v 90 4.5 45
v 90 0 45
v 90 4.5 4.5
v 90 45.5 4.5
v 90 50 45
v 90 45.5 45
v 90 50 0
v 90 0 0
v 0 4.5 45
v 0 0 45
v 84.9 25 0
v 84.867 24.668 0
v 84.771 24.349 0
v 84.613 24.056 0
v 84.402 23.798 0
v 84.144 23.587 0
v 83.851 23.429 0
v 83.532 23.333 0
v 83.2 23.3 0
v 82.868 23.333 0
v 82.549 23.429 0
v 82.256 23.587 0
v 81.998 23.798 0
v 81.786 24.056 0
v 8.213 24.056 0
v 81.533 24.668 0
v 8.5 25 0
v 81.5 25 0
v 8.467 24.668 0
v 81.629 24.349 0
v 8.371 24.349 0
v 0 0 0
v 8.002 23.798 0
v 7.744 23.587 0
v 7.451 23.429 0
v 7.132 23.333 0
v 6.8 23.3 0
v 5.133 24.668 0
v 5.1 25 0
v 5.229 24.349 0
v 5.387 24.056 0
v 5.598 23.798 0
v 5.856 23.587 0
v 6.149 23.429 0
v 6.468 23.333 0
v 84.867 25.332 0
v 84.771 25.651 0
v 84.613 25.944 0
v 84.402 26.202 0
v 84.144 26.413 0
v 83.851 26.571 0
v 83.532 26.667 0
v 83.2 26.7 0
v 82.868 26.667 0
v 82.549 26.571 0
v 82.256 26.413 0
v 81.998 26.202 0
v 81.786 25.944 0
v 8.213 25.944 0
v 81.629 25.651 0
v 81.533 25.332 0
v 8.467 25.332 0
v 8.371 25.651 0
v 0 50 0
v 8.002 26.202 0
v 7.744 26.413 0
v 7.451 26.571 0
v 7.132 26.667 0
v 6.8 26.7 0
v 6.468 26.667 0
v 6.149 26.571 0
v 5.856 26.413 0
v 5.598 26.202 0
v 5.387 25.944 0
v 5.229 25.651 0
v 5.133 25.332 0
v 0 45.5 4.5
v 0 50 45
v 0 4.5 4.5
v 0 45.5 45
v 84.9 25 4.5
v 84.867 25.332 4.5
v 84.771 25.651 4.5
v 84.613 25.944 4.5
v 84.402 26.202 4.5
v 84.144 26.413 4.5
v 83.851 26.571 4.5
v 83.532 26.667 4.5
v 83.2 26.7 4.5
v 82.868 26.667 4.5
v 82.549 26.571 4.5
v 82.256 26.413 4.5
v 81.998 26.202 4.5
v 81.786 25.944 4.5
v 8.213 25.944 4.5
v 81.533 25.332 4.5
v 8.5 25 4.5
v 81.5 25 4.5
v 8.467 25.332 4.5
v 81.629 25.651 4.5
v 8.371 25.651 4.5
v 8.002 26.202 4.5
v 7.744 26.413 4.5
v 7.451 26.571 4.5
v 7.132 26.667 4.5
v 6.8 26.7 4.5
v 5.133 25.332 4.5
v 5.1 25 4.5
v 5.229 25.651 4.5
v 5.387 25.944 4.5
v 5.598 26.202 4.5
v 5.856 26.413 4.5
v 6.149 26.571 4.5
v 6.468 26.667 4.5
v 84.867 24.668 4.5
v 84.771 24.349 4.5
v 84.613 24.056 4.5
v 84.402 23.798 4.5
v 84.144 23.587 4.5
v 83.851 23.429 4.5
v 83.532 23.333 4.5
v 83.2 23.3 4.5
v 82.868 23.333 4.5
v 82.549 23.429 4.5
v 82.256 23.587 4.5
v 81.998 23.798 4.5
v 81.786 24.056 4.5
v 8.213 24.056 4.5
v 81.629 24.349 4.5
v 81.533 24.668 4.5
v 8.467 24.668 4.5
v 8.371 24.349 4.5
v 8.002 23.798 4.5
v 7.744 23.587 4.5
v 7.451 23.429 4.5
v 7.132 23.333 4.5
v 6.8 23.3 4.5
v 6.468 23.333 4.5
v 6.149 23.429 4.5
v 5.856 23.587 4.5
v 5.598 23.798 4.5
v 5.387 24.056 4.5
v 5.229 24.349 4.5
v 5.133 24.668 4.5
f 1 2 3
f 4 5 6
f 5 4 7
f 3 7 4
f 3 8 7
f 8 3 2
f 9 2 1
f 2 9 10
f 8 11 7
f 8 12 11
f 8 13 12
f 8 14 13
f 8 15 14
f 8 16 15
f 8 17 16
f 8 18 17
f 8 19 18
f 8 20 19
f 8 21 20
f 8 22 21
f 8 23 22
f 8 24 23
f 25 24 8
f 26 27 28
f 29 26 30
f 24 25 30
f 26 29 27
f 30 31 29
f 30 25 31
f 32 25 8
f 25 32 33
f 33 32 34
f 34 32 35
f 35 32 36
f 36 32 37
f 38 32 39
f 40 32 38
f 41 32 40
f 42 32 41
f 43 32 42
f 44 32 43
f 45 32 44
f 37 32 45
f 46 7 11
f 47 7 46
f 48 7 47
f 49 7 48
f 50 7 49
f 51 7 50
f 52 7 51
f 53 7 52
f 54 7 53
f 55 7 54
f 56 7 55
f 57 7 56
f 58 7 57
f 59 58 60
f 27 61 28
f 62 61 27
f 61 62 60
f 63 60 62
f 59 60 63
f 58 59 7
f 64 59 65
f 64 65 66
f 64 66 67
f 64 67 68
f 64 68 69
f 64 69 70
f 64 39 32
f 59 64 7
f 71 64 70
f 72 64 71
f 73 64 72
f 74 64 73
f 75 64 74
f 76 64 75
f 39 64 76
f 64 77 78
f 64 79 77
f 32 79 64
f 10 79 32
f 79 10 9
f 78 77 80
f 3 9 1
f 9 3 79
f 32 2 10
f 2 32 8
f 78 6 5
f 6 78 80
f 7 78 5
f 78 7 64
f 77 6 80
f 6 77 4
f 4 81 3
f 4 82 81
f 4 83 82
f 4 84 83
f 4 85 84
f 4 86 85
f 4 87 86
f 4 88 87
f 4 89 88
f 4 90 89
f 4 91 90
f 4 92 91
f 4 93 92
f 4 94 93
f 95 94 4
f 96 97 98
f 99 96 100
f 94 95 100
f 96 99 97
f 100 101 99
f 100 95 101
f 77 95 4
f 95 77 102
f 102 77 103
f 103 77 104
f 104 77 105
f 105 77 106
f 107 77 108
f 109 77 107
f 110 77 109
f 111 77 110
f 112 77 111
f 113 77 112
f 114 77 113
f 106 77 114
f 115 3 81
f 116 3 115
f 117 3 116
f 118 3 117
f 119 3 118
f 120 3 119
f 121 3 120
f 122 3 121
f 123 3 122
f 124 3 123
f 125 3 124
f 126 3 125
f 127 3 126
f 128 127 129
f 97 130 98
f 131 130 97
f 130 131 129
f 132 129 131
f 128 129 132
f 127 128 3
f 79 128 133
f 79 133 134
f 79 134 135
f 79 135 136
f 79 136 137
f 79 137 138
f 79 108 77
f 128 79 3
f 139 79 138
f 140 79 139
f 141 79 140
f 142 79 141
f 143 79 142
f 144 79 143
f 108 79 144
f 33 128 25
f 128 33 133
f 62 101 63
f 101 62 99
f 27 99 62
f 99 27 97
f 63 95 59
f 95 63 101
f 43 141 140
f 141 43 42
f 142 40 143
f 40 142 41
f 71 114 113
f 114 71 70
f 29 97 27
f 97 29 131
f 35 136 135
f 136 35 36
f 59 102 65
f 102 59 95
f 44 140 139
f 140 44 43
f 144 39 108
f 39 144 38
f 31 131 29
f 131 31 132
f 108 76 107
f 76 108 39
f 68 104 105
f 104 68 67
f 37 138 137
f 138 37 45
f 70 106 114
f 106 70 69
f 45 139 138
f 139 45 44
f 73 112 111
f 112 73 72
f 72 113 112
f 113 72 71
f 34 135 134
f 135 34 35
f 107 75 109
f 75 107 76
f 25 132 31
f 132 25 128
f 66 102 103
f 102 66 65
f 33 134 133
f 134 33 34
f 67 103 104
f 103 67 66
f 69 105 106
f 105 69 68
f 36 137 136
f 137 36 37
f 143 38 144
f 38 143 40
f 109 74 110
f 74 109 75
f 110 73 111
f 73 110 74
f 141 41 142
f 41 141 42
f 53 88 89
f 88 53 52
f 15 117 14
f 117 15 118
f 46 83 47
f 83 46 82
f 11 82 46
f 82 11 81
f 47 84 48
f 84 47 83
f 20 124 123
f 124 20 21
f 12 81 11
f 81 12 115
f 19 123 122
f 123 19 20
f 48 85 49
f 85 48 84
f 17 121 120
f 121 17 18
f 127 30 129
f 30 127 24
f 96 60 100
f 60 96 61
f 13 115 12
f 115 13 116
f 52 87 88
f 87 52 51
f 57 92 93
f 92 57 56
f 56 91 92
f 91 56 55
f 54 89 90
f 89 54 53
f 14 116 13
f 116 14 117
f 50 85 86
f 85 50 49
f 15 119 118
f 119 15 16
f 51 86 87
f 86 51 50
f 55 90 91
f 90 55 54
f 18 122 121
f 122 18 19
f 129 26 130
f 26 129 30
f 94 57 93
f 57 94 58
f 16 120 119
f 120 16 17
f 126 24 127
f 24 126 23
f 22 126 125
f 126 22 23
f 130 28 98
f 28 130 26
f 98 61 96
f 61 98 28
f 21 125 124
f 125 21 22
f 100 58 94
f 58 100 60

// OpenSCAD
$fn = 32;

// ----------------------------------------------------------------------
// U-bracket: 90 x 50 x 45 mm
// ----------------------------------------------------------------------

// --- parameters (mm) ---
base_len = 90;            // outer length, X
channel_w = 50;           // outer width, Y
upright_h = 45;           // upright height, Z
mat_t = 4.5;              // wall thickness
hole_d = 3.4;             // clearance for M3

module hole_z(px, py) {
  translate([px, py, -0.5]) cylinder(h = mat_t + 1, d = hole_d);
}
module hole_y_pz(pz) {
  /* through both uprights along Y */
  translate([0, -0.5, pz]) rotate([-90, 0, 0]) cylinder(h = channel_w + 1, d = hole_d);
}

module base() {
  cube([base_len, channel_w, mat_t]);
}

module uprights() {
  cube([base_len, mat_t, upright_h]);
  translate([0, channel_w - mat_t, 0]) cube([base_len, mat_t, upright_h]);
}

difference() {
  union() {
    base();
    uprights();
  }
  hole_z(6.8, 25);
  hole_z(83.2, 25);
}
